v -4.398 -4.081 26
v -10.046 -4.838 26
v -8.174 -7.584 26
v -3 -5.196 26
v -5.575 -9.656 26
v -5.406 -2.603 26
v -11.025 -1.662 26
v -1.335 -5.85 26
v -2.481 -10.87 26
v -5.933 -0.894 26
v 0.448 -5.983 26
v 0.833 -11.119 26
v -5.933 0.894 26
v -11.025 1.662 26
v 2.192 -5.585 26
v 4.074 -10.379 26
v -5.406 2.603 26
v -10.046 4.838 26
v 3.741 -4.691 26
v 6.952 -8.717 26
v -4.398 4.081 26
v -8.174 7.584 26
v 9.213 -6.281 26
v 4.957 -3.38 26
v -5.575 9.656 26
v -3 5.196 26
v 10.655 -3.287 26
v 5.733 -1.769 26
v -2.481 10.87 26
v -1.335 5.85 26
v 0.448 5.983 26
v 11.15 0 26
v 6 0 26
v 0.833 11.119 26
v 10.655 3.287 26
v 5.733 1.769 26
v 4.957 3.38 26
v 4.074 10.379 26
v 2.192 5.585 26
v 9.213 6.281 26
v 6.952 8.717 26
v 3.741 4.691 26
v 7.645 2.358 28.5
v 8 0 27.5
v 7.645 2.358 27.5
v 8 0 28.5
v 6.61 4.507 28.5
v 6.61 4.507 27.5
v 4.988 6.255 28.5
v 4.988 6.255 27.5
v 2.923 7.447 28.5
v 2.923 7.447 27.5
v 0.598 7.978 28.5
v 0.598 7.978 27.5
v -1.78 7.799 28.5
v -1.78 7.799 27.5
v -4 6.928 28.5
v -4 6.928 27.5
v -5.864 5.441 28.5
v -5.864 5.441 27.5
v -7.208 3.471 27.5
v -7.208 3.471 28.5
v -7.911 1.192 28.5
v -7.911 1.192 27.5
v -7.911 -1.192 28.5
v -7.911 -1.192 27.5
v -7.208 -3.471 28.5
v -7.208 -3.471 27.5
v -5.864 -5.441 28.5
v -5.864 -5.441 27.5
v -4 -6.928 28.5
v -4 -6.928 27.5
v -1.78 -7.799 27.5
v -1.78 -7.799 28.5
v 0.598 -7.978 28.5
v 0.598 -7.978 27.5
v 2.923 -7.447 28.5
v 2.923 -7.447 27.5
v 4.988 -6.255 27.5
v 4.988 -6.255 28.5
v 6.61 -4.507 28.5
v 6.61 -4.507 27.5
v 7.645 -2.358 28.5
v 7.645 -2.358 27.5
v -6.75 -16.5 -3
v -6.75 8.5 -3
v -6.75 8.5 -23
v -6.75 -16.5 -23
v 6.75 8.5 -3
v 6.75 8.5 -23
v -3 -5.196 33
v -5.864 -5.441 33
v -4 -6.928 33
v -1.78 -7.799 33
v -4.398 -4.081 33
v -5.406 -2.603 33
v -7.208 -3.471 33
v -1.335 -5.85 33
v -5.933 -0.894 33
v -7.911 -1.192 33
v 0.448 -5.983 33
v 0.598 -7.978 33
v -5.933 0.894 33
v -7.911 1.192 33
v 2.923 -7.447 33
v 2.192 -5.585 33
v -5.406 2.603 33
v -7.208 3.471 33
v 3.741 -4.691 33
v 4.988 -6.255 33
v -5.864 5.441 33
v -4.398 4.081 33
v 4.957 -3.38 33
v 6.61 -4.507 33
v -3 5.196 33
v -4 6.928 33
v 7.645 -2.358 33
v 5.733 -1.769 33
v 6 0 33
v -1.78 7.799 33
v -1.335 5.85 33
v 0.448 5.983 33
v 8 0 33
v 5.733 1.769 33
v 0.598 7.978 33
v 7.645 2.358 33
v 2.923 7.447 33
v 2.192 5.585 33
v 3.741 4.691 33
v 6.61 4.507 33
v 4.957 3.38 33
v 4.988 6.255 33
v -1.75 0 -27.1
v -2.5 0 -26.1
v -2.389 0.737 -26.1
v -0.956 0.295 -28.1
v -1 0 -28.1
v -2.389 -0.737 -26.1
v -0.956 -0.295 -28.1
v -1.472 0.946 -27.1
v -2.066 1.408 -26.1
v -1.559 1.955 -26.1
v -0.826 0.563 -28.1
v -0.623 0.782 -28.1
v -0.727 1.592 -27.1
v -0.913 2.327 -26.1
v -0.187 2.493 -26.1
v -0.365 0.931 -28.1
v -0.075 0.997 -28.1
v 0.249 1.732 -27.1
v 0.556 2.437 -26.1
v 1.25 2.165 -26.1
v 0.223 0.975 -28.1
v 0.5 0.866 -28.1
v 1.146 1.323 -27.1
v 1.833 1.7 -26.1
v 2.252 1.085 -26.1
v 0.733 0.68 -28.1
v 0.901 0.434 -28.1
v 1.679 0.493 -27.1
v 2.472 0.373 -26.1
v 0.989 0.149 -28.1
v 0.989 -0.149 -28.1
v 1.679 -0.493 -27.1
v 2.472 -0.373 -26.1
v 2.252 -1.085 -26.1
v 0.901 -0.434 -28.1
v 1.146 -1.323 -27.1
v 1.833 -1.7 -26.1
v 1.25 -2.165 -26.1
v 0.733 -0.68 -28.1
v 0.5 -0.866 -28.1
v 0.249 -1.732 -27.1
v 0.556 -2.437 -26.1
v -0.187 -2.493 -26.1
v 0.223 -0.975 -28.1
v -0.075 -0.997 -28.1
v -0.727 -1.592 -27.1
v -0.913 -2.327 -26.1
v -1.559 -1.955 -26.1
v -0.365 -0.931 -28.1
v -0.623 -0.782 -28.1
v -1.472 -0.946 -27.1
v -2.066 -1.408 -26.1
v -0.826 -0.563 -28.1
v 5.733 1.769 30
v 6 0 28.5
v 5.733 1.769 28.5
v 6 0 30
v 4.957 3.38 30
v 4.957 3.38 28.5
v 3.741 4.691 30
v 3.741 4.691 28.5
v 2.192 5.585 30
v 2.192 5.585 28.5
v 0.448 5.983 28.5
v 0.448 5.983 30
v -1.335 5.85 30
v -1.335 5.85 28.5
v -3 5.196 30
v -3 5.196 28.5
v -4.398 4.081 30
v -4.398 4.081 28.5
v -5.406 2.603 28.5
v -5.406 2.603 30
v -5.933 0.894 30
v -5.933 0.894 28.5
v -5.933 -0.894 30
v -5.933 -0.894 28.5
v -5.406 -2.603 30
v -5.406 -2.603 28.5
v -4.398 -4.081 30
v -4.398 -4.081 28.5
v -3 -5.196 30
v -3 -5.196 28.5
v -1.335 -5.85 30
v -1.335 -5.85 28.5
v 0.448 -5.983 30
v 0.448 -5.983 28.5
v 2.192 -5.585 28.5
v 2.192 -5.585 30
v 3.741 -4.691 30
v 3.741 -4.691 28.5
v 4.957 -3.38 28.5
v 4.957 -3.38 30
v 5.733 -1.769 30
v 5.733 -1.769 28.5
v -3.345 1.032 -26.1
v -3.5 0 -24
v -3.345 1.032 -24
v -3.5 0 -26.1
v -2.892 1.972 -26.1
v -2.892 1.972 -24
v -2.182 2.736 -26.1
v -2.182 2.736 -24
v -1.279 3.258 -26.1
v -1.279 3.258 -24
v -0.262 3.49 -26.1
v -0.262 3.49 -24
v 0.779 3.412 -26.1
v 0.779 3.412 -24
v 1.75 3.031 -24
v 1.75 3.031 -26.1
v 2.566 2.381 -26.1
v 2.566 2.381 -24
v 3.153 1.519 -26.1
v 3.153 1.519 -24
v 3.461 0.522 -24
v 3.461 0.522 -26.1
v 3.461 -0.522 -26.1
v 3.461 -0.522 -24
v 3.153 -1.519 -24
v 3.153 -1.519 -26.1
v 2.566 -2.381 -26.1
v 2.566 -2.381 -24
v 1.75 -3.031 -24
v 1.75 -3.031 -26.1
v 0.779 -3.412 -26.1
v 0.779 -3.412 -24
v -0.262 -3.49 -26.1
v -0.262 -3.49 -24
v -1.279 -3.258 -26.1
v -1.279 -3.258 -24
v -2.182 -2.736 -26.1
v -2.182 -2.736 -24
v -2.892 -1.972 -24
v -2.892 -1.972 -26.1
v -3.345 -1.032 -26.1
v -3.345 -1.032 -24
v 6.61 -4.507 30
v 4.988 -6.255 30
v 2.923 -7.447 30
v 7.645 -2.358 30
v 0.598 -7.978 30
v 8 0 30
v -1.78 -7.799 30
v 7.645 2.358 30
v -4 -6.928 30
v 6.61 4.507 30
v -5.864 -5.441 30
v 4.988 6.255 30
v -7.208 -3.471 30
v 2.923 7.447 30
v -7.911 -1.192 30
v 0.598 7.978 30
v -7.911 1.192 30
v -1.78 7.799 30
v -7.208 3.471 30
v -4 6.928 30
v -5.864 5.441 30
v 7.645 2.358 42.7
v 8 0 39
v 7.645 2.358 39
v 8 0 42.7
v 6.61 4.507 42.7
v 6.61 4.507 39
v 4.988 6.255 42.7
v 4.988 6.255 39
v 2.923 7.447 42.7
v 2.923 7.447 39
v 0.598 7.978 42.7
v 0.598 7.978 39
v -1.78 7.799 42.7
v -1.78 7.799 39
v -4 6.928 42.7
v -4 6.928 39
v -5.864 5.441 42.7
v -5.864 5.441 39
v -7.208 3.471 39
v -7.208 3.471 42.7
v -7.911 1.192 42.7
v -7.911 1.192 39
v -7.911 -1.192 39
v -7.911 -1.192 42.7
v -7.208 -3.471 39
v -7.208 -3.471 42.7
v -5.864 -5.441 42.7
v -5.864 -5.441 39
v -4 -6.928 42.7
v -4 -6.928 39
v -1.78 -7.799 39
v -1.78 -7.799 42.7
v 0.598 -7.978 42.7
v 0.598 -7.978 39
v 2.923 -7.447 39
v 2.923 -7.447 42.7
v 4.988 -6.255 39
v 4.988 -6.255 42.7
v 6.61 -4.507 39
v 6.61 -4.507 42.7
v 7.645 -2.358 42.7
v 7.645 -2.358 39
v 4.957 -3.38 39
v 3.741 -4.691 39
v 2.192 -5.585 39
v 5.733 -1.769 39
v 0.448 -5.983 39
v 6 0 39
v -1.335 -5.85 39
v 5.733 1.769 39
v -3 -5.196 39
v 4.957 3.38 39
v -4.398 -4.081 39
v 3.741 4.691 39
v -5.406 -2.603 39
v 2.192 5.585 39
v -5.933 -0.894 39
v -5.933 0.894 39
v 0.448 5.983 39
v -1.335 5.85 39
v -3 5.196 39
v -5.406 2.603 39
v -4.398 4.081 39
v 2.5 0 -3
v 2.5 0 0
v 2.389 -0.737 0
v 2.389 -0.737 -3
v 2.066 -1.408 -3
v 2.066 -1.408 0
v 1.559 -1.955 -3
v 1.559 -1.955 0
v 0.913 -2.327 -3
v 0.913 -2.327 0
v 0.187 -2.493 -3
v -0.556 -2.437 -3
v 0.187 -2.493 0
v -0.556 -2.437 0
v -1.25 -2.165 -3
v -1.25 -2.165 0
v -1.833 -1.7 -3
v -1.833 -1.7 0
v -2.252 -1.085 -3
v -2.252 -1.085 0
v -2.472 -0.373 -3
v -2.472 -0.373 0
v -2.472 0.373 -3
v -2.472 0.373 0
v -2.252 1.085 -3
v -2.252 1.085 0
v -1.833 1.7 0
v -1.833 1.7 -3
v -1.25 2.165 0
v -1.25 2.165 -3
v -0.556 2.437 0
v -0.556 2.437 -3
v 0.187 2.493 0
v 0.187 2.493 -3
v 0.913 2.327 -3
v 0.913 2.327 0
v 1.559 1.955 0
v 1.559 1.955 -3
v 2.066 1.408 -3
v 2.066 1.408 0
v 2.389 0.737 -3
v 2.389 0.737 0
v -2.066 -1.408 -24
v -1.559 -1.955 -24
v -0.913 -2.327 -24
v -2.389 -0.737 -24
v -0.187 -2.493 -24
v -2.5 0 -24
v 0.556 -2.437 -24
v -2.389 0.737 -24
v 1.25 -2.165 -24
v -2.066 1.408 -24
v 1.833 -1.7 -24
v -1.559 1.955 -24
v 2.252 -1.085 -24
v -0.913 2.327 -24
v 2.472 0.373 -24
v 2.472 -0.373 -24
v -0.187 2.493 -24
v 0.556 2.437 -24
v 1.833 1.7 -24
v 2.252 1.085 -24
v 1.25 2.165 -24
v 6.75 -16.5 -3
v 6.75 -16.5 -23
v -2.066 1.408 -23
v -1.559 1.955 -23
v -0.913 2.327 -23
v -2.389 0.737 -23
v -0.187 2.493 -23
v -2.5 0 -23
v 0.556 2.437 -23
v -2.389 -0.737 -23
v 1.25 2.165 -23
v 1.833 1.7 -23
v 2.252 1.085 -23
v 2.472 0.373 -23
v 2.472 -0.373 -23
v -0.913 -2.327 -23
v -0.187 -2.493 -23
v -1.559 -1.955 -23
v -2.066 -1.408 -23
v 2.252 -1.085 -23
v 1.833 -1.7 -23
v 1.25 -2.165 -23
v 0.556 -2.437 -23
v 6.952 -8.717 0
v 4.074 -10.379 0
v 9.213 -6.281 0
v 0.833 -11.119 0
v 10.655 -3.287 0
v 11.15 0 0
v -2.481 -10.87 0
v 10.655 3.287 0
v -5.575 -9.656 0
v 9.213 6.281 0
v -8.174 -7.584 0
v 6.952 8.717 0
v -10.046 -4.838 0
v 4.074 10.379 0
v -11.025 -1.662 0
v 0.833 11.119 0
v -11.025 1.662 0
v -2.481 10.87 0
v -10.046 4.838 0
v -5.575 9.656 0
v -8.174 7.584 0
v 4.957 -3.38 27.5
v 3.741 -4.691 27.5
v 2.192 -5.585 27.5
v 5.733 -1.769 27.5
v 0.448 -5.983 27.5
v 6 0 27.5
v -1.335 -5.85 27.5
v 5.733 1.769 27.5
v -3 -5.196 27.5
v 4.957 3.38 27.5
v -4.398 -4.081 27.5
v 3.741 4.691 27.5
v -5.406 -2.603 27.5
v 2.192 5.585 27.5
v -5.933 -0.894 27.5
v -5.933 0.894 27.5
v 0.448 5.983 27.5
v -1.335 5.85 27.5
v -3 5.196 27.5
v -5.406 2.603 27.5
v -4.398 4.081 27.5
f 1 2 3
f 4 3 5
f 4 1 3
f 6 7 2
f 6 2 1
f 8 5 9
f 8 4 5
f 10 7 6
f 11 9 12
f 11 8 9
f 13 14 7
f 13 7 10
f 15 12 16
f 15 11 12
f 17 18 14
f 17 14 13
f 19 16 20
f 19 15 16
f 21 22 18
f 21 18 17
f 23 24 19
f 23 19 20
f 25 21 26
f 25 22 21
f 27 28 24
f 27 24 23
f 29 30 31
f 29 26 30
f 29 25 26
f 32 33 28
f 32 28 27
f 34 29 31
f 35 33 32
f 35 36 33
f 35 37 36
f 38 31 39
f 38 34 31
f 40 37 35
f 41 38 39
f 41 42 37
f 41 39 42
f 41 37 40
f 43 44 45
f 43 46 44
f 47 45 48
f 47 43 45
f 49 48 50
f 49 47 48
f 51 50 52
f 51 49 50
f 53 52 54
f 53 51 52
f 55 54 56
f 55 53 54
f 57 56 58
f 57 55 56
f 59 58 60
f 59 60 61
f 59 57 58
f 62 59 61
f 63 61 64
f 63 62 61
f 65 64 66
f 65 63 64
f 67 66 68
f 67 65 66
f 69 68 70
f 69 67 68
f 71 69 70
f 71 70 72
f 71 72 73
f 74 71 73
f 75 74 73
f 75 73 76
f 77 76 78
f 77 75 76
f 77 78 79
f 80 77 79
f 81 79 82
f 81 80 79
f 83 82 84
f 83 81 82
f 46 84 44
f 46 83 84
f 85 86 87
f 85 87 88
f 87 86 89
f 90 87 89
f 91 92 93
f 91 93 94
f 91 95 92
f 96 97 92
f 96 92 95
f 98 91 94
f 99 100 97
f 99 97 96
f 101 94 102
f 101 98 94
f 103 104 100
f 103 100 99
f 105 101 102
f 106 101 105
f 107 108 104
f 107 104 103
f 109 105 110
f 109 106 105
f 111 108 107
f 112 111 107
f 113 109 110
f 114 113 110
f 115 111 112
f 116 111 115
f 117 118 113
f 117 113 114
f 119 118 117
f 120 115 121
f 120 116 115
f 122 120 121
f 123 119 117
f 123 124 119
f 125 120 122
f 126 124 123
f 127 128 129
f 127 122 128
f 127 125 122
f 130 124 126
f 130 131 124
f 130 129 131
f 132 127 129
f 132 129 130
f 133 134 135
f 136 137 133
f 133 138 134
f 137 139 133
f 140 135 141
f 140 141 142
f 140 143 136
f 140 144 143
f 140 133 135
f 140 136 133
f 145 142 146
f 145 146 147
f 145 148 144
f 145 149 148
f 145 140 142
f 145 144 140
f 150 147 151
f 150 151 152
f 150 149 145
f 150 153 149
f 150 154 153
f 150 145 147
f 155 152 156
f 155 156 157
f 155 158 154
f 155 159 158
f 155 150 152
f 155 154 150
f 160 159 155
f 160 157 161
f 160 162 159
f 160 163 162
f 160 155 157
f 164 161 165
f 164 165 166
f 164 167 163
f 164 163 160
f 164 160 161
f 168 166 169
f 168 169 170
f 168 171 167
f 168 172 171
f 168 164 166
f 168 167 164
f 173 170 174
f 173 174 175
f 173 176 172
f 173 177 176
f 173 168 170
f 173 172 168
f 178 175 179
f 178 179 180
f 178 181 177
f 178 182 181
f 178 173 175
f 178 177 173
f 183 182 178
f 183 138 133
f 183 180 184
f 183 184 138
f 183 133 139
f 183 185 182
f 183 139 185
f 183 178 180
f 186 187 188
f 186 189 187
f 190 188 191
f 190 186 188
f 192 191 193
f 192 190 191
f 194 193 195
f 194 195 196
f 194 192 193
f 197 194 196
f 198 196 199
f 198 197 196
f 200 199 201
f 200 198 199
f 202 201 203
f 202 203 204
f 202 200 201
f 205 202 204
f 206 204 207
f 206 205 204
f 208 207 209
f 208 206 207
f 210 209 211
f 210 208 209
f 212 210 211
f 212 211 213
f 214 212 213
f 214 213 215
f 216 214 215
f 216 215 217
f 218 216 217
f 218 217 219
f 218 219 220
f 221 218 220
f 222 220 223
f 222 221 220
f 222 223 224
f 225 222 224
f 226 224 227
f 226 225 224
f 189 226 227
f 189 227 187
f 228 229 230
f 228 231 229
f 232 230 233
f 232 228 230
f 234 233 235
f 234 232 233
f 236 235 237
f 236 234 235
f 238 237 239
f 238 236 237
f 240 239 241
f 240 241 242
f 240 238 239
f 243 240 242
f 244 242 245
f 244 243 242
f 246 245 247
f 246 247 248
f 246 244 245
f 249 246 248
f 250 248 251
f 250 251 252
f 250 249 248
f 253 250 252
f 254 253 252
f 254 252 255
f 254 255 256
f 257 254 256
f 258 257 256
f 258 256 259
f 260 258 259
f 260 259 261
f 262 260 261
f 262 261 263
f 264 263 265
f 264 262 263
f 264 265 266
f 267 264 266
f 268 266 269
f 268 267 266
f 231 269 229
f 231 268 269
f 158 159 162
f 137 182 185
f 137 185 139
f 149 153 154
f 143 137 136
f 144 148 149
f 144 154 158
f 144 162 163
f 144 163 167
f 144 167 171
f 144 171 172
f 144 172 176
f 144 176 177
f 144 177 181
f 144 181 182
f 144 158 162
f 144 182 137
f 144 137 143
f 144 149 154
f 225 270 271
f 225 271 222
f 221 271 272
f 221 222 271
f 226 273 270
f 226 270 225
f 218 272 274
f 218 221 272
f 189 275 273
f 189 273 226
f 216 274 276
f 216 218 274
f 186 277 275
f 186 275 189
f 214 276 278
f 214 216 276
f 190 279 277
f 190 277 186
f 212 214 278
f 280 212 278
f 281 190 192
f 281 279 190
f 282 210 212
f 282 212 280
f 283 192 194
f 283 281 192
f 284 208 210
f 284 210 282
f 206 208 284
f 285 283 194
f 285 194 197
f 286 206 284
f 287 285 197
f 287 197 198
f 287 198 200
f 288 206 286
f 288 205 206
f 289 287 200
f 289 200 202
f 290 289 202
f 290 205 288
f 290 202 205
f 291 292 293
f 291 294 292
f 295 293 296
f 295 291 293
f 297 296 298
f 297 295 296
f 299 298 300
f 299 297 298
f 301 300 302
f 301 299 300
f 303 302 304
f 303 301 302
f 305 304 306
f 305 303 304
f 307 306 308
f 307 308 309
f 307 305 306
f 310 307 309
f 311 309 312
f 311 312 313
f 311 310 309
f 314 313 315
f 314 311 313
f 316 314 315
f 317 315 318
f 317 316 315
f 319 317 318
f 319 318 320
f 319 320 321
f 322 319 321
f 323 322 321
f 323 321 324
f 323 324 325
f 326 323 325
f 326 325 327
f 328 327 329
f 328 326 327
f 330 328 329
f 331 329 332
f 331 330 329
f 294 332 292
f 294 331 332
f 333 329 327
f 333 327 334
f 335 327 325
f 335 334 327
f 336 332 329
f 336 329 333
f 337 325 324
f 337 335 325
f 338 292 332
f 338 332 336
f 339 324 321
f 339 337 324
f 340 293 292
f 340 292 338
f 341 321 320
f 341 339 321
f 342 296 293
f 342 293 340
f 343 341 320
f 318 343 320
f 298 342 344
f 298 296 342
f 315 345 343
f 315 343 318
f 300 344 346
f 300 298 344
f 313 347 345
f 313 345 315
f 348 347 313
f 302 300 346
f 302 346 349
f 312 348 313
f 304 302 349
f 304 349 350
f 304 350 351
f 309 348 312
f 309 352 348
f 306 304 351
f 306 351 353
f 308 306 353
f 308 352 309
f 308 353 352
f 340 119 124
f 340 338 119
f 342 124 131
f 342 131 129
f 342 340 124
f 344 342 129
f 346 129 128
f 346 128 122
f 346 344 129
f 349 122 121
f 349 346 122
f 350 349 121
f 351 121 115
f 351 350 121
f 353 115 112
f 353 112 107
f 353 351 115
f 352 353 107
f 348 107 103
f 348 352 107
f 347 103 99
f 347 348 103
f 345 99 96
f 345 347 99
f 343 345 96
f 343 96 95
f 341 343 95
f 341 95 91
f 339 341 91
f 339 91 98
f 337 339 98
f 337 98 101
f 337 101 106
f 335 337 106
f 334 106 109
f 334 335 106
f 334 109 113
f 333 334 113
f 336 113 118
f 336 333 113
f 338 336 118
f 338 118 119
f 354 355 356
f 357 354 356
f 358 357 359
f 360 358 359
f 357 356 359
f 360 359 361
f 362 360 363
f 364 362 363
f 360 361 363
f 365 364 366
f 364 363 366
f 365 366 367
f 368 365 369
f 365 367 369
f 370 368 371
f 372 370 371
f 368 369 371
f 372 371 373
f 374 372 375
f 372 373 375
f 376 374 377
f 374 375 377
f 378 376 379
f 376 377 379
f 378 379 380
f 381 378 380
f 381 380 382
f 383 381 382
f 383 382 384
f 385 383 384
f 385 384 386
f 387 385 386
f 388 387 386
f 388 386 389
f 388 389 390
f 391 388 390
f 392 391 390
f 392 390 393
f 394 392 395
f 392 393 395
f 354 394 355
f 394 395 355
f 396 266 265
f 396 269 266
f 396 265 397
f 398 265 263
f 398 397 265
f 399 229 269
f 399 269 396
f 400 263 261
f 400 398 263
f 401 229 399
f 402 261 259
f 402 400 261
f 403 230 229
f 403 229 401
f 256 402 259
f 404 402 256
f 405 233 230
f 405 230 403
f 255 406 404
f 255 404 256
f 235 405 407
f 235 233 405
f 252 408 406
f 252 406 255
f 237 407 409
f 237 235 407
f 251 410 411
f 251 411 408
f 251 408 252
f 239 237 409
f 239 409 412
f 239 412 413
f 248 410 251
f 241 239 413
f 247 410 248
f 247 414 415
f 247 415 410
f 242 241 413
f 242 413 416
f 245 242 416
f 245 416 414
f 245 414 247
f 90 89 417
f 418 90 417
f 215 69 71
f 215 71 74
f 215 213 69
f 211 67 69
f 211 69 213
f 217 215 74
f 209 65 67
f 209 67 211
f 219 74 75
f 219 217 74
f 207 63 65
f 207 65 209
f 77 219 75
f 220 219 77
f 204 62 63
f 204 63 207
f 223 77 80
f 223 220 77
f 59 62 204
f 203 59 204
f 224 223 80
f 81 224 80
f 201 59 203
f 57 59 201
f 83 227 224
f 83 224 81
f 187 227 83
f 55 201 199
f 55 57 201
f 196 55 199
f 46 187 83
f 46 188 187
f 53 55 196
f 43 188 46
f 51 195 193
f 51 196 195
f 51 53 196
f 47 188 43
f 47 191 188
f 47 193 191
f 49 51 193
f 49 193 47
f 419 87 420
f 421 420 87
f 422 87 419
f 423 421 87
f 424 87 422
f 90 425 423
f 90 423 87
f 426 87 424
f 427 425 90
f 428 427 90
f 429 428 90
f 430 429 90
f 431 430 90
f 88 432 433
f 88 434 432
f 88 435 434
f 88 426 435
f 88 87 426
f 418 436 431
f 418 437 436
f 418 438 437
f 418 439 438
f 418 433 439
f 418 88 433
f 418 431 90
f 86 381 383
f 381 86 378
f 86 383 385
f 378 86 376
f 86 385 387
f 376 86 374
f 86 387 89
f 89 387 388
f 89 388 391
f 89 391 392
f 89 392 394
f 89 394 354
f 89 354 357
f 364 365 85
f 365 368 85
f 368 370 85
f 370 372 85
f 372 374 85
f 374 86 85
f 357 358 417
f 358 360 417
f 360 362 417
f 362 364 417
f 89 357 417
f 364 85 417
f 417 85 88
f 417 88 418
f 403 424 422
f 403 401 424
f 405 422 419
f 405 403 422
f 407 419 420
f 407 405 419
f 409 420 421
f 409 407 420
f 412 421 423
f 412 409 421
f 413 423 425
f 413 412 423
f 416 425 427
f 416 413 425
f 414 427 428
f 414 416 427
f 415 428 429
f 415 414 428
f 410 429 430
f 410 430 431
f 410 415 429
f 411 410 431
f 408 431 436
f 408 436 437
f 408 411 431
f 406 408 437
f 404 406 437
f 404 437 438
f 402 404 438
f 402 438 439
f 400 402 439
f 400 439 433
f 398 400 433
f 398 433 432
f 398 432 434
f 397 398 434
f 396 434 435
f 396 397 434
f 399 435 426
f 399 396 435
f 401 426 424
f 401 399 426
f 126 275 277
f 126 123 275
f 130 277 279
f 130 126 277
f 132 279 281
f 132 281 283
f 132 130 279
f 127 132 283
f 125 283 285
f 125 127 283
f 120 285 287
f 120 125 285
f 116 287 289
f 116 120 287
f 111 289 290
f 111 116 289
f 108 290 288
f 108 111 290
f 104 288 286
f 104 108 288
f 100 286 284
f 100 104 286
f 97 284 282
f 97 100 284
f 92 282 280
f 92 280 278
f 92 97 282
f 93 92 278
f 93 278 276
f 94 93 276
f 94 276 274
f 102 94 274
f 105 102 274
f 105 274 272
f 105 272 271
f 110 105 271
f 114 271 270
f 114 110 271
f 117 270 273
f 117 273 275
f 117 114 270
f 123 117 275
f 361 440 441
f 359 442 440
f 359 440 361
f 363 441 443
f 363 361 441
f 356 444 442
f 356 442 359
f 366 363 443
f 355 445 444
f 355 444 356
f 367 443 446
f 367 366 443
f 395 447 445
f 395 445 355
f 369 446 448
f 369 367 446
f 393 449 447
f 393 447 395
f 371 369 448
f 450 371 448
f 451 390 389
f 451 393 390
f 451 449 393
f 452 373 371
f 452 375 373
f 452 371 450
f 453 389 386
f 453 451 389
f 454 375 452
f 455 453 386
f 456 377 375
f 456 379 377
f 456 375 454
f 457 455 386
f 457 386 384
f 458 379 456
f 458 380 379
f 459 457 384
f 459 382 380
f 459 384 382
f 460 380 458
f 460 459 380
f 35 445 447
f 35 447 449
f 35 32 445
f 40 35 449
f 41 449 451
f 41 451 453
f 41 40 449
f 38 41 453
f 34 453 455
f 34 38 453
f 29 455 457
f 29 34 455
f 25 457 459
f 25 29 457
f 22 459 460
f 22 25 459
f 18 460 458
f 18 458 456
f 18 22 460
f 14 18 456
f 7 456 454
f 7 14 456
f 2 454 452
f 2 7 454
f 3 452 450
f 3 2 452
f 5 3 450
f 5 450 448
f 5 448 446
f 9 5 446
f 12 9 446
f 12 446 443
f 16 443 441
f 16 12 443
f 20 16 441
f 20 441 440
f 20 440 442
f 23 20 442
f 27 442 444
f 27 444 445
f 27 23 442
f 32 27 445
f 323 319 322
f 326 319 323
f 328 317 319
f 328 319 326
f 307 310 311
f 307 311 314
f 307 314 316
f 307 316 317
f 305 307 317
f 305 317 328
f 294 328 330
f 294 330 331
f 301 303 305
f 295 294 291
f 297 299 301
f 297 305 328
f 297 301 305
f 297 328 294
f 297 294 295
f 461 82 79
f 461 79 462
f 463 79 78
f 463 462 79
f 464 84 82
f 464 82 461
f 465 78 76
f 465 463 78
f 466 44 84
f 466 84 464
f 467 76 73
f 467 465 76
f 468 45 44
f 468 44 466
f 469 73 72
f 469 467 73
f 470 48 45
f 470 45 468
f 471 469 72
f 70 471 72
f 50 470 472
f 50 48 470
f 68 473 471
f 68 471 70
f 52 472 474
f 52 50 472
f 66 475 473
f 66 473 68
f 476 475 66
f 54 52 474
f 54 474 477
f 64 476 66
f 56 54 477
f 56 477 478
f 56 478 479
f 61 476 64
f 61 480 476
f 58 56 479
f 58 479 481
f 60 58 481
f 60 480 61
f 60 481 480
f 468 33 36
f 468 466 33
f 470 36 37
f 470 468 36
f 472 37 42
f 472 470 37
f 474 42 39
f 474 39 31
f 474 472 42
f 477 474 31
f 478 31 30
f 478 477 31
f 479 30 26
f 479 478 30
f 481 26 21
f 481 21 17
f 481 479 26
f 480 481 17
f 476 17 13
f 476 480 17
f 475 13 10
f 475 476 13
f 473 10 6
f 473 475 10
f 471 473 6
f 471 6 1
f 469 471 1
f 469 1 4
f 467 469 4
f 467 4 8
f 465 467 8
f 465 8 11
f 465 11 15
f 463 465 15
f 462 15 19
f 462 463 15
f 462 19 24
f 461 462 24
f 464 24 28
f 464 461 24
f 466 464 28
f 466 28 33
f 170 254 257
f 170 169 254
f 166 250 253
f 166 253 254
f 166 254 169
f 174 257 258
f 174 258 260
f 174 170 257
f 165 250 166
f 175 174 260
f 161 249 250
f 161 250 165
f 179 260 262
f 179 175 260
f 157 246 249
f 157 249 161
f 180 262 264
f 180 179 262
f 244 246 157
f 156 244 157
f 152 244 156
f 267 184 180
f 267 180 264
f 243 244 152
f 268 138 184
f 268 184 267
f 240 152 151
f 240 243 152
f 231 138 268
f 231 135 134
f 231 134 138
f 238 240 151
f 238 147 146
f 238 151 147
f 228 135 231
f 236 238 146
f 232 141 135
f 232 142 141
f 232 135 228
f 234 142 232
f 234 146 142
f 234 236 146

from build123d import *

# Parameters (mm, degrees)
F2_R     = 2.5
F3_DEPTH = 3
F4_W     = 13.5
F4_H     = 25
F5_DEPTH = 20


with BuildPart() as f1:
    # F0 (on Front) → F1 (revolve)
    with BuildSketch(Plane.XZ):
        Polygon((0, 42.7), (0, 0), (11.15, 0), (11.15, 26), (6, 26), (6, 27.5), (8, 27.5), (8, 28.5), (6, 28.5), (6, 30), (8, 30), (8, 33), (6, 33), (6, 39), (8, 39), (8, 42.7), align=None)
    revolve(axis=Axis((0, 0, 21.35), (0, 0, 1)))

    # F2 (on face) → F3 (join)
    with BuildSketch(Plane(origin=(0, 0, 0), x_dir=(1, 0, 0), z_dir=(0, 0, -1))):
        Circle(F2_R)
    extrude(amount=F3_DEPTH)

    # F4 (on face) → F5 (join)
    with BuildSketch(Plane(origin=(0, 0, -3), x_dir=(1, 0, 0), z_dir=(0, 0, -1))):
        with Locations((0, 4)):
            Rectangle(F4_W, F4_H)
    extrude(amount=F5_DEPTH)

    # F6 (on Front) → F7 (revolve)
    with BuildSketch(Plane.XZ):
        Polygon((0, -28.1), (0, -23), (-2.5, -23), (-2.5, -24), (-3.5, -24), (-3.5, -26.1), (-2.5, -26.1), (-1, -28.1), align=None)
    revolve(axis=Axis((0, 0, -25.55), (0, 0, -1)))


solid = f1.part
